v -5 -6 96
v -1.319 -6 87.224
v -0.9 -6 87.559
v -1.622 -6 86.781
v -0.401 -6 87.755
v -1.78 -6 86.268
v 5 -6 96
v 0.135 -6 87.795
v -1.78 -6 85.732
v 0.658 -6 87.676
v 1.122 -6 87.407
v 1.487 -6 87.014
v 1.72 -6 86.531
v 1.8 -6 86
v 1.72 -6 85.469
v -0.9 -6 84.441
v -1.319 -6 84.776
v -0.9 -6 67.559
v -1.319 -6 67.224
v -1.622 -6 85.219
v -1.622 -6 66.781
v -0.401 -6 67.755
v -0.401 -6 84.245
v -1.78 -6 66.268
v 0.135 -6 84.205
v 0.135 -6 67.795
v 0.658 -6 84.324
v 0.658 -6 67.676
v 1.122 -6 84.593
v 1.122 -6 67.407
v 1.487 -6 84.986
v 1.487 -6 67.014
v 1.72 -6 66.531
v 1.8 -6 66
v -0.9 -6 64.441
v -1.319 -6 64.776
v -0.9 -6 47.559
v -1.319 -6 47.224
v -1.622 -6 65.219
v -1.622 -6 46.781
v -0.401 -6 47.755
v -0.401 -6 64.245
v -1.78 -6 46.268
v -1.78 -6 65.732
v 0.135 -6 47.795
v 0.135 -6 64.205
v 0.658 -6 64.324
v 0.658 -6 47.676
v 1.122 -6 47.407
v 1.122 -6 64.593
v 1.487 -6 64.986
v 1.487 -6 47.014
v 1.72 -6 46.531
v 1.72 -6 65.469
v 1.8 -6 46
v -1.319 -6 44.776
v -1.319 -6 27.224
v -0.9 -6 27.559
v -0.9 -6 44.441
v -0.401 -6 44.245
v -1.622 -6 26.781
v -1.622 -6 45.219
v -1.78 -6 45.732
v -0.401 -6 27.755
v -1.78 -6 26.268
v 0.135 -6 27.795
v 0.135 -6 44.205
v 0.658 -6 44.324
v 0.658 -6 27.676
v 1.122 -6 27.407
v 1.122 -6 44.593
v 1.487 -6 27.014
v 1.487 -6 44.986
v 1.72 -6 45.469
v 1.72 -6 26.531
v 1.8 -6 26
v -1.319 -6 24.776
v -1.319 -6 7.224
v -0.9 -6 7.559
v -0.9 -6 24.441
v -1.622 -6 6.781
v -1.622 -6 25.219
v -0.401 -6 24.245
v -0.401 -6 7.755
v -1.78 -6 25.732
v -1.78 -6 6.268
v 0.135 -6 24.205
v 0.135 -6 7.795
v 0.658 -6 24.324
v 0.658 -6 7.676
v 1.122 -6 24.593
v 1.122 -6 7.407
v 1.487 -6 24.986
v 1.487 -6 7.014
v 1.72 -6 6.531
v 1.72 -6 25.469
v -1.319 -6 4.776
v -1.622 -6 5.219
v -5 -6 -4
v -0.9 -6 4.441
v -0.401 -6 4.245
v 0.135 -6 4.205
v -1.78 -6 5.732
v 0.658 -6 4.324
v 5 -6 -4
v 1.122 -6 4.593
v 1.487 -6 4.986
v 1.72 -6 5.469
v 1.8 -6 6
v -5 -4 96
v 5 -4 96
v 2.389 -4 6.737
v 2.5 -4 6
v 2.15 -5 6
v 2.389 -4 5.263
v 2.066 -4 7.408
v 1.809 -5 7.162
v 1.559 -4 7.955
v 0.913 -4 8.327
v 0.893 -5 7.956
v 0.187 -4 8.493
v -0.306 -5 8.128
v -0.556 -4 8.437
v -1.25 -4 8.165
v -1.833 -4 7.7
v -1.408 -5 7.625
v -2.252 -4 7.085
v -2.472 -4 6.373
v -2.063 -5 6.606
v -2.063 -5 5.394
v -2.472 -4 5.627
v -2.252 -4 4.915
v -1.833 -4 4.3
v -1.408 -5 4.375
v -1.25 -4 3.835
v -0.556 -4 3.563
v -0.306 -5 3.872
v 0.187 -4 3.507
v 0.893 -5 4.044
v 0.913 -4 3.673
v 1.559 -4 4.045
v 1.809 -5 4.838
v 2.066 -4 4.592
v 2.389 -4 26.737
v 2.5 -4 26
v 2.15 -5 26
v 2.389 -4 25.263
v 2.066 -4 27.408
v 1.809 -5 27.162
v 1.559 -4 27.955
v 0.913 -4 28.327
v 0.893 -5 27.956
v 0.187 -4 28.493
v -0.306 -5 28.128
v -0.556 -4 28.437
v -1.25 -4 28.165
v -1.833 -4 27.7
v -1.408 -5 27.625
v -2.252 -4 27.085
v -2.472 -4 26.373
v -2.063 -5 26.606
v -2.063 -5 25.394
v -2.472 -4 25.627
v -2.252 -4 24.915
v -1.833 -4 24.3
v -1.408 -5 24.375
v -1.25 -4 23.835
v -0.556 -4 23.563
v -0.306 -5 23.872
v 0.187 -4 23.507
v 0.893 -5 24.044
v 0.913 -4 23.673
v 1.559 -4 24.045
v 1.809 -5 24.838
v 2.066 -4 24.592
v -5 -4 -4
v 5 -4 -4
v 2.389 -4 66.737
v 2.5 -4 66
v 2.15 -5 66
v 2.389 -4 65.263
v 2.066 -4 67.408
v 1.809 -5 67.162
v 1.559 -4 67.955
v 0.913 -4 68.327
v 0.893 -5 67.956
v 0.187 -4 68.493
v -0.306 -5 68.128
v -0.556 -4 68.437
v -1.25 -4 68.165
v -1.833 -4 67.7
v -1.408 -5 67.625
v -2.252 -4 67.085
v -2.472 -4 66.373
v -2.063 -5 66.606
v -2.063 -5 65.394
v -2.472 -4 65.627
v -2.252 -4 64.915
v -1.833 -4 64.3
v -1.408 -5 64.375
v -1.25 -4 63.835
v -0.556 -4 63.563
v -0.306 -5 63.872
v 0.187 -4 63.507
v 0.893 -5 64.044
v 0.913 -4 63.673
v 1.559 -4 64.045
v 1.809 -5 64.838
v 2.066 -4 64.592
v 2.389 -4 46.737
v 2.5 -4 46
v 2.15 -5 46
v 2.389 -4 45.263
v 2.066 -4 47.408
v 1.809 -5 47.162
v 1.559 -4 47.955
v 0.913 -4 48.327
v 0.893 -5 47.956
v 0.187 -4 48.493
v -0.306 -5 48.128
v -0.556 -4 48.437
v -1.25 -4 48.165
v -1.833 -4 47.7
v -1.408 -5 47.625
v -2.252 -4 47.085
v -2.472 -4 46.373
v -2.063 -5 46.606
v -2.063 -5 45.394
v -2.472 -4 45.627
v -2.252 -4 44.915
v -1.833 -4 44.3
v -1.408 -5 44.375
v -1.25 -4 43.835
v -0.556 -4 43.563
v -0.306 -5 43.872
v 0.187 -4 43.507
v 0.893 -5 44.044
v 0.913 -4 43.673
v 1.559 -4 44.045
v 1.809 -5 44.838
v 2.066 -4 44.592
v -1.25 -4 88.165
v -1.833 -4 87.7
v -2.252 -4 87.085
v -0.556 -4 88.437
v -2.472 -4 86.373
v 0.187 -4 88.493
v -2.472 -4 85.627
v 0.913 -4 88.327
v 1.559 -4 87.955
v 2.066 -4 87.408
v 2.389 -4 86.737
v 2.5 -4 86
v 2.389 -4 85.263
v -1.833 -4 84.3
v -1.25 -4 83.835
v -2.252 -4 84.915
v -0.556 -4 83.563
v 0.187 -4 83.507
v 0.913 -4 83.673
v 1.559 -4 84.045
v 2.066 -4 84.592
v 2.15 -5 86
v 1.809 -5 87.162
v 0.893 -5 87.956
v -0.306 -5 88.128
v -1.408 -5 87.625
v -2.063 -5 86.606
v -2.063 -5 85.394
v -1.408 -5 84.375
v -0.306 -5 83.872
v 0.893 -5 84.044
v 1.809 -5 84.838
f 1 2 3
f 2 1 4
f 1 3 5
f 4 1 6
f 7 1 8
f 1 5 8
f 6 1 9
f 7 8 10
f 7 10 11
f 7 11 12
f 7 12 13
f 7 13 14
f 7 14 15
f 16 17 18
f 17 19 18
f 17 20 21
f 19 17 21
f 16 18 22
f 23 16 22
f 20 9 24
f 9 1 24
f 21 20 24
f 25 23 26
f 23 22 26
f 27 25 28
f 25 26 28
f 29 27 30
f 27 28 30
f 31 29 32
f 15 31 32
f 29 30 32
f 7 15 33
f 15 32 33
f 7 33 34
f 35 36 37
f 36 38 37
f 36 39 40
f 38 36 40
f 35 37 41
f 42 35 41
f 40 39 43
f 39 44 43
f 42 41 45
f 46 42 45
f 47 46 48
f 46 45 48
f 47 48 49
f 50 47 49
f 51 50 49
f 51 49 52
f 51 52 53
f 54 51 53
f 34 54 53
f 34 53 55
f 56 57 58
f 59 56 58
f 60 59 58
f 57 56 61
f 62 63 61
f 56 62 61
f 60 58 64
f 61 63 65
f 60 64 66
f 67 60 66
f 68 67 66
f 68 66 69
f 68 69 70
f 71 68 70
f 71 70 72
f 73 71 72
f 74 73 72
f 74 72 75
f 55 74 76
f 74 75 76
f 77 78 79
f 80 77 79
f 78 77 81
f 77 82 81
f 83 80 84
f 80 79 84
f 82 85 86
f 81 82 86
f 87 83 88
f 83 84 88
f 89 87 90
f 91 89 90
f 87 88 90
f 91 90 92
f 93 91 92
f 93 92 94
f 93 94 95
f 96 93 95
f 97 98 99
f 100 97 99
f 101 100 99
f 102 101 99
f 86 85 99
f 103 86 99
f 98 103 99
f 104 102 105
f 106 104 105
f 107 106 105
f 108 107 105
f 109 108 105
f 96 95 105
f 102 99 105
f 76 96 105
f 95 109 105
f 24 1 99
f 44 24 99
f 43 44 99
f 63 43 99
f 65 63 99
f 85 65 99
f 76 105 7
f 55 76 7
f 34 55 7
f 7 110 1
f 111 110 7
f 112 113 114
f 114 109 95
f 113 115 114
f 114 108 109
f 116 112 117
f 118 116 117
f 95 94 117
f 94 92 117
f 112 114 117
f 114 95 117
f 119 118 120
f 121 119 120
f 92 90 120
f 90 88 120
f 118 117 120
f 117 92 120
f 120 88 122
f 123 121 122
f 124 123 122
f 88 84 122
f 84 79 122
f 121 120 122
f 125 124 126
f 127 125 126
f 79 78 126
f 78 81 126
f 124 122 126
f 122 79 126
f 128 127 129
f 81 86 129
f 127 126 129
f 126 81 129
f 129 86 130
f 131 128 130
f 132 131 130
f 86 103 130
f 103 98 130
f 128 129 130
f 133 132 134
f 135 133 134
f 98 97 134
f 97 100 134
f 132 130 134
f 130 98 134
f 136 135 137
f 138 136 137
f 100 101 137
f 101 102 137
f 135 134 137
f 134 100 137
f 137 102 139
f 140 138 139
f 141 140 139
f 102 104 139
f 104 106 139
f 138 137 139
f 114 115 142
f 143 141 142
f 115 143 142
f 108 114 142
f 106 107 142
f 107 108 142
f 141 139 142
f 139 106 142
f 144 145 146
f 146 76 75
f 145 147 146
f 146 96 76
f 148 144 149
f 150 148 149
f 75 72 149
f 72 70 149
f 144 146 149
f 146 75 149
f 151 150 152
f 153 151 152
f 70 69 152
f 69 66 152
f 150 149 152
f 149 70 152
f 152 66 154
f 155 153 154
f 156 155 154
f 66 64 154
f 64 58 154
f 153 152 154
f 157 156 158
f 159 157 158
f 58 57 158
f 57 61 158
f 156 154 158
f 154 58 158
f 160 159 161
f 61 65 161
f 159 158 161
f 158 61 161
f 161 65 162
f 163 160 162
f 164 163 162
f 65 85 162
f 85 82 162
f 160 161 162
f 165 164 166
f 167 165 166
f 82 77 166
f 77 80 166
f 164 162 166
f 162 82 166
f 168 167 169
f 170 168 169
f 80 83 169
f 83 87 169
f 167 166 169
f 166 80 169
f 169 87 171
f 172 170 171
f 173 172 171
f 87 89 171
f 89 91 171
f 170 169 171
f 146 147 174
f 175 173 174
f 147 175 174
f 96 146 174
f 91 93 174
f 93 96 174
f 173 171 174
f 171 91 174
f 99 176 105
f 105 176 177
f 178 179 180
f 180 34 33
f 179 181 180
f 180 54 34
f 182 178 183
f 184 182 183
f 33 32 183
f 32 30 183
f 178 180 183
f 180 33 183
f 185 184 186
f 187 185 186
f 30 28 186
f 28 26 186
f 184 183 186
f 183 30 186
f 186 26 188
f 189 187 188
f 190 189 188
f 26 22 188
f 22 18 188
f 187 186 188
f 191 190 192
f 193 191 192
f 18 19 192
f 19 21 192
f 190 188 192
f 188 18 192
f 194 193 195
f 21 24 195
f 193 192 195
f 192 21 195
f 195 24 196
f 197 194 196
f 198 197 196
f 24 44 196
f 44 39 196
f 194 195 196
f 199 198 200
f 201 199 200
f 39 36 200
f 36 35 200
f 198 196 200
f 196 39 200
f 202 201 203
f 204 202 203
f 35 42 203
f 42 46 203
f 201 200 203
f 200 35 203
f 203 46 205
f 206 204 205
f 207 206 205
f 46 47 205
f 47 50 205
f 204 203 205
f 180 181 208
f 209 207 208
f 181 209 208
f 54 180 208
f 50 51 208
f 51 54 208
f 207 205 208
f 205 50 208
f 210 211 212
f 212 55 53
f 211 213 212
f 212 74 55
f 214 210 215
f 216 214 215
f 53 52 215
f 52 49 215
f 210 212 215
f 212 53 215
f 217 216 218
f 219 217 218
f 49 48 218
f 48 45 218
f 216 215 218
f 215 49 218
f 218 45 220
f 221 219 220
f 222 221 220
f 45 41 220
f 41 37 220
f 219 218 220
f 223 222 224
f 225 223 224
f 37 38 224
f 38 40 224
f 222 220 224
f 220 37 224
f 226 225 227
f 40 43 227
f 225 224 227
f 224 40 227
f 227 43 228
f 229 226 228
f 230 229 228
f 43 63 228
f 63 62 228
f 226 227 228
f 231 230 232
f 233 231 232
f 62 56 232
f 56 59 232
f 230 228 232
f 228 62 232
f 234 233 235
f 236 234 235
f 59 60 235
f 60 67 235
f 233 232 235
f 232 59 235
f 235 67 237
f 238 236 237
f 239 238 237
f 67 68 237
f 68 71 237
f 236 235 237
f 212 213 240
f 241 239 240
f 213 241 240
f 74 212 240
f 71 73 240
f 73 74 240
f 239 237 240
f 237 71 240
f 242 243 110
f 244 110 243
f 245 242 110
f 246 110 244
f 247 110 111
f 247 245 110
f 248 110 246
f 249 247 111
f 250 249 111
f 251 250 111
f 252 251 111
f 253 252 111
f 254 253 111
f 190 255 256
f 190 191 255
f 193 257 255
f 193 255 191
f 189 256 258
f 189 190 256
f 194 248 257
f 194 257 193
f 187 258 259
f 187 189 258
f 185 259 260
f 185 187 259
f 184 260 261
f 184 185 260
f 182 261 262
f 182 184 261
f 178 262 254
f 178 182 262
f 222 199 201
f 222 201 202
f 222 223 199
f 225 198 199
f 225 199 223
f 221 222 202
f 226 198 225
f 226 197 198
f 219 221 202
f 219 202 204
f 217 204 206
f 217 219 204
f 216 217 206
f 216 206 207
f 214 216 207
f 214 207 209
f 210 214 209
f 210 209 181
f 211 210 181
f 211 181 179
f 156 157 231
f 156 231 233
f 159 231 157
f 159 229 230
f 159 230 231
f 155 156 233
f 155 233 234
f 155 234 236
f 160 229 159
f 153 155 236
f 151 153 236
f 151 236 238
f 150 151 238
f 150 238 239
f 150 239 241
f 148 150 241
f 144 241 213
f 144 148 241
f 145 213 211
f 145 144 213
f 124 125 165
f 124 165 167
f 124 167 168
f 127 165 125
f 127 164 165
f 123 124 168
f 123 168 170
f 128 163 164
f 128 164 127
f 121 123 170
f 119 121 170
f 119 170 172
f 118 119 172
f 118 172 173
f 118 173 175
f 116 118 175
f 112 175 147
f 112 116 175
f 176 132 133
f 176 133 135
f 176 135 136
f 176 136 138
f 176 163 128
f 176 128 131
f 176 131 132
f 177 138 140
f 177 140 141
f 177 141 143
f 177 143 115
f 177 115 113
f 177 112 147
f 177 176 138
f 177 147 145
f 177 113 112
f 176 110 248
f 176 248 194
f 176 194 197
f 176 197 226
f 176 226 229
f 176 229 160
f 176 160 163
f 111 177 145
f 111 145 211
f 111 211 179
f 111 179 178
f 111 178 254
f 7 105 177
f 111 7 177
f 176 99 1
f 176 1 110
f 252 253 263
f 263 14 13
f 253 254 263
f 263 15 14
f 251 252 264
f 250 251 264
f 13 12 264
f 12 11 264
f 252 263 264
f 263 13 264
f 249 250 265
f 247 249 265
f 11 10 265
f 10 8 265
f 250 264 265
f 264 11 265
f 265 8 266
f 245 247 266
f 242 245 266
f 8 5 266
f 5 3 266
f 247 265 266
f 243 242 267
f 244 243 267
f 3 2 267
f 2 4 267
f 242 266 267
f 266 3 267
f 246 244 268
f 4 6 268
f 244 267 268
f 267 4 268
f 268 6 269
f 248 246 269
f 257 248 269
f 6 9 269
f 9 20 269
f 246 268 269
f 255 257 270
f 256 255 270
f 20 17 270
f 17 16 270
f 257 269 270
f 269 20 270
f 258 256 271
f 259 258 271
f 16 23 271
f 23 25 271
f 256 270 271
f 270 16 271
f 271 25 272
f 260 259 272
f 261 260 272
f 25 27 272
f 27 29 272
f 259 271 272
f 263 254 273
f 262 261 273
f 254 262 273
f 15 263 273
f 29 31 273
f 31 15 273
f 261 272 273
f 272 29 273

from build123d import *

# Parameters (mm, degrees)
CYLINDER070_R           = 2.5
CYLINDER070_DEPTH       = 2
CYLINDER069_R           = 1.5
CYLINDER069_DEPTH       = 10
BODY007_PLACEMENT_ANGLE = 90
ARRAY001039_Z_COUNT     = 5
ARRAY001039_Z_PITCH     = 20
BOX037_W                = 10
BOX037_H                = 2
BOX037_DEPTH            = 100


with BuildPart() as screw_cone_hole:
    # Cone005 → Cone005 (revolve)
    with BuildSketch(Plane.XZ):
        Polygon((0, 0), (2.5, 0), (1.8, 2), (0, 2), align=None)
    revolve(axis=Axis((0, 0, 0), (0, 0, 1)))


with BuildPart() as screw_head_hole:
    # Cylinder070 → Cylinder070 (new body)
    with BuildSketch(Plane.XY.offset(-2)):
        Circle(CYLINDER070_R)
    extrude(amount=CYLINDER070_DEPTH)


with BuildPart() as screw_hole_array:
    # Cylinder069 → Cylinder069 (new body)
    with BuildSketch(Plane.XY):
        Circle(CYLINDER069_R)
    extrude(amount=CYLINDER069_DEPTH)

    # Fusion047: union screw cone hole, screw head hole
    add(screw_cone_hole.part)
    add(screw_head_hole.part)


with BuildPart() as screw_hole_array_1:
    # Body007 placement: moved
    add(screw_hole_array.part.moved(Location((0, -4, 6))).rotate(Axis((0, -4, 6), (1, 0, 0)), BODY007_PLACEMENT_ANGLE))

    # Array001039 Z: screw hole array ×5


with BuildPart() as screw_hole_array_2:
    add(screw_hole_array_1.part)
    with Locations(*[(0, 0, i * ARRAY001039_Z_PITCH) for i in range(1, ARRAY001039_Z_COUNT)]):
        add(screw_hole_array_1.part)


with BuildPart() as wire_holder_cube_cut:
    # Box037 → Box037 (new body)
    with BuildSketch(Plane(origin=(-5, -6, -4), x_dir=(1, 0, 0), z_dir=(0, 0, 1))):
        with Locations((5, 1)):
            Rectangle(BOX037_W, BOX037_H)
    extrude(amount=BOX037_DEPTH)

    # Cut023010: cut screw hole array
    add(screw_hole_array_2.part, mode=Mode.SUBTRACT)


solid = wire_holder_cube_cut.part
